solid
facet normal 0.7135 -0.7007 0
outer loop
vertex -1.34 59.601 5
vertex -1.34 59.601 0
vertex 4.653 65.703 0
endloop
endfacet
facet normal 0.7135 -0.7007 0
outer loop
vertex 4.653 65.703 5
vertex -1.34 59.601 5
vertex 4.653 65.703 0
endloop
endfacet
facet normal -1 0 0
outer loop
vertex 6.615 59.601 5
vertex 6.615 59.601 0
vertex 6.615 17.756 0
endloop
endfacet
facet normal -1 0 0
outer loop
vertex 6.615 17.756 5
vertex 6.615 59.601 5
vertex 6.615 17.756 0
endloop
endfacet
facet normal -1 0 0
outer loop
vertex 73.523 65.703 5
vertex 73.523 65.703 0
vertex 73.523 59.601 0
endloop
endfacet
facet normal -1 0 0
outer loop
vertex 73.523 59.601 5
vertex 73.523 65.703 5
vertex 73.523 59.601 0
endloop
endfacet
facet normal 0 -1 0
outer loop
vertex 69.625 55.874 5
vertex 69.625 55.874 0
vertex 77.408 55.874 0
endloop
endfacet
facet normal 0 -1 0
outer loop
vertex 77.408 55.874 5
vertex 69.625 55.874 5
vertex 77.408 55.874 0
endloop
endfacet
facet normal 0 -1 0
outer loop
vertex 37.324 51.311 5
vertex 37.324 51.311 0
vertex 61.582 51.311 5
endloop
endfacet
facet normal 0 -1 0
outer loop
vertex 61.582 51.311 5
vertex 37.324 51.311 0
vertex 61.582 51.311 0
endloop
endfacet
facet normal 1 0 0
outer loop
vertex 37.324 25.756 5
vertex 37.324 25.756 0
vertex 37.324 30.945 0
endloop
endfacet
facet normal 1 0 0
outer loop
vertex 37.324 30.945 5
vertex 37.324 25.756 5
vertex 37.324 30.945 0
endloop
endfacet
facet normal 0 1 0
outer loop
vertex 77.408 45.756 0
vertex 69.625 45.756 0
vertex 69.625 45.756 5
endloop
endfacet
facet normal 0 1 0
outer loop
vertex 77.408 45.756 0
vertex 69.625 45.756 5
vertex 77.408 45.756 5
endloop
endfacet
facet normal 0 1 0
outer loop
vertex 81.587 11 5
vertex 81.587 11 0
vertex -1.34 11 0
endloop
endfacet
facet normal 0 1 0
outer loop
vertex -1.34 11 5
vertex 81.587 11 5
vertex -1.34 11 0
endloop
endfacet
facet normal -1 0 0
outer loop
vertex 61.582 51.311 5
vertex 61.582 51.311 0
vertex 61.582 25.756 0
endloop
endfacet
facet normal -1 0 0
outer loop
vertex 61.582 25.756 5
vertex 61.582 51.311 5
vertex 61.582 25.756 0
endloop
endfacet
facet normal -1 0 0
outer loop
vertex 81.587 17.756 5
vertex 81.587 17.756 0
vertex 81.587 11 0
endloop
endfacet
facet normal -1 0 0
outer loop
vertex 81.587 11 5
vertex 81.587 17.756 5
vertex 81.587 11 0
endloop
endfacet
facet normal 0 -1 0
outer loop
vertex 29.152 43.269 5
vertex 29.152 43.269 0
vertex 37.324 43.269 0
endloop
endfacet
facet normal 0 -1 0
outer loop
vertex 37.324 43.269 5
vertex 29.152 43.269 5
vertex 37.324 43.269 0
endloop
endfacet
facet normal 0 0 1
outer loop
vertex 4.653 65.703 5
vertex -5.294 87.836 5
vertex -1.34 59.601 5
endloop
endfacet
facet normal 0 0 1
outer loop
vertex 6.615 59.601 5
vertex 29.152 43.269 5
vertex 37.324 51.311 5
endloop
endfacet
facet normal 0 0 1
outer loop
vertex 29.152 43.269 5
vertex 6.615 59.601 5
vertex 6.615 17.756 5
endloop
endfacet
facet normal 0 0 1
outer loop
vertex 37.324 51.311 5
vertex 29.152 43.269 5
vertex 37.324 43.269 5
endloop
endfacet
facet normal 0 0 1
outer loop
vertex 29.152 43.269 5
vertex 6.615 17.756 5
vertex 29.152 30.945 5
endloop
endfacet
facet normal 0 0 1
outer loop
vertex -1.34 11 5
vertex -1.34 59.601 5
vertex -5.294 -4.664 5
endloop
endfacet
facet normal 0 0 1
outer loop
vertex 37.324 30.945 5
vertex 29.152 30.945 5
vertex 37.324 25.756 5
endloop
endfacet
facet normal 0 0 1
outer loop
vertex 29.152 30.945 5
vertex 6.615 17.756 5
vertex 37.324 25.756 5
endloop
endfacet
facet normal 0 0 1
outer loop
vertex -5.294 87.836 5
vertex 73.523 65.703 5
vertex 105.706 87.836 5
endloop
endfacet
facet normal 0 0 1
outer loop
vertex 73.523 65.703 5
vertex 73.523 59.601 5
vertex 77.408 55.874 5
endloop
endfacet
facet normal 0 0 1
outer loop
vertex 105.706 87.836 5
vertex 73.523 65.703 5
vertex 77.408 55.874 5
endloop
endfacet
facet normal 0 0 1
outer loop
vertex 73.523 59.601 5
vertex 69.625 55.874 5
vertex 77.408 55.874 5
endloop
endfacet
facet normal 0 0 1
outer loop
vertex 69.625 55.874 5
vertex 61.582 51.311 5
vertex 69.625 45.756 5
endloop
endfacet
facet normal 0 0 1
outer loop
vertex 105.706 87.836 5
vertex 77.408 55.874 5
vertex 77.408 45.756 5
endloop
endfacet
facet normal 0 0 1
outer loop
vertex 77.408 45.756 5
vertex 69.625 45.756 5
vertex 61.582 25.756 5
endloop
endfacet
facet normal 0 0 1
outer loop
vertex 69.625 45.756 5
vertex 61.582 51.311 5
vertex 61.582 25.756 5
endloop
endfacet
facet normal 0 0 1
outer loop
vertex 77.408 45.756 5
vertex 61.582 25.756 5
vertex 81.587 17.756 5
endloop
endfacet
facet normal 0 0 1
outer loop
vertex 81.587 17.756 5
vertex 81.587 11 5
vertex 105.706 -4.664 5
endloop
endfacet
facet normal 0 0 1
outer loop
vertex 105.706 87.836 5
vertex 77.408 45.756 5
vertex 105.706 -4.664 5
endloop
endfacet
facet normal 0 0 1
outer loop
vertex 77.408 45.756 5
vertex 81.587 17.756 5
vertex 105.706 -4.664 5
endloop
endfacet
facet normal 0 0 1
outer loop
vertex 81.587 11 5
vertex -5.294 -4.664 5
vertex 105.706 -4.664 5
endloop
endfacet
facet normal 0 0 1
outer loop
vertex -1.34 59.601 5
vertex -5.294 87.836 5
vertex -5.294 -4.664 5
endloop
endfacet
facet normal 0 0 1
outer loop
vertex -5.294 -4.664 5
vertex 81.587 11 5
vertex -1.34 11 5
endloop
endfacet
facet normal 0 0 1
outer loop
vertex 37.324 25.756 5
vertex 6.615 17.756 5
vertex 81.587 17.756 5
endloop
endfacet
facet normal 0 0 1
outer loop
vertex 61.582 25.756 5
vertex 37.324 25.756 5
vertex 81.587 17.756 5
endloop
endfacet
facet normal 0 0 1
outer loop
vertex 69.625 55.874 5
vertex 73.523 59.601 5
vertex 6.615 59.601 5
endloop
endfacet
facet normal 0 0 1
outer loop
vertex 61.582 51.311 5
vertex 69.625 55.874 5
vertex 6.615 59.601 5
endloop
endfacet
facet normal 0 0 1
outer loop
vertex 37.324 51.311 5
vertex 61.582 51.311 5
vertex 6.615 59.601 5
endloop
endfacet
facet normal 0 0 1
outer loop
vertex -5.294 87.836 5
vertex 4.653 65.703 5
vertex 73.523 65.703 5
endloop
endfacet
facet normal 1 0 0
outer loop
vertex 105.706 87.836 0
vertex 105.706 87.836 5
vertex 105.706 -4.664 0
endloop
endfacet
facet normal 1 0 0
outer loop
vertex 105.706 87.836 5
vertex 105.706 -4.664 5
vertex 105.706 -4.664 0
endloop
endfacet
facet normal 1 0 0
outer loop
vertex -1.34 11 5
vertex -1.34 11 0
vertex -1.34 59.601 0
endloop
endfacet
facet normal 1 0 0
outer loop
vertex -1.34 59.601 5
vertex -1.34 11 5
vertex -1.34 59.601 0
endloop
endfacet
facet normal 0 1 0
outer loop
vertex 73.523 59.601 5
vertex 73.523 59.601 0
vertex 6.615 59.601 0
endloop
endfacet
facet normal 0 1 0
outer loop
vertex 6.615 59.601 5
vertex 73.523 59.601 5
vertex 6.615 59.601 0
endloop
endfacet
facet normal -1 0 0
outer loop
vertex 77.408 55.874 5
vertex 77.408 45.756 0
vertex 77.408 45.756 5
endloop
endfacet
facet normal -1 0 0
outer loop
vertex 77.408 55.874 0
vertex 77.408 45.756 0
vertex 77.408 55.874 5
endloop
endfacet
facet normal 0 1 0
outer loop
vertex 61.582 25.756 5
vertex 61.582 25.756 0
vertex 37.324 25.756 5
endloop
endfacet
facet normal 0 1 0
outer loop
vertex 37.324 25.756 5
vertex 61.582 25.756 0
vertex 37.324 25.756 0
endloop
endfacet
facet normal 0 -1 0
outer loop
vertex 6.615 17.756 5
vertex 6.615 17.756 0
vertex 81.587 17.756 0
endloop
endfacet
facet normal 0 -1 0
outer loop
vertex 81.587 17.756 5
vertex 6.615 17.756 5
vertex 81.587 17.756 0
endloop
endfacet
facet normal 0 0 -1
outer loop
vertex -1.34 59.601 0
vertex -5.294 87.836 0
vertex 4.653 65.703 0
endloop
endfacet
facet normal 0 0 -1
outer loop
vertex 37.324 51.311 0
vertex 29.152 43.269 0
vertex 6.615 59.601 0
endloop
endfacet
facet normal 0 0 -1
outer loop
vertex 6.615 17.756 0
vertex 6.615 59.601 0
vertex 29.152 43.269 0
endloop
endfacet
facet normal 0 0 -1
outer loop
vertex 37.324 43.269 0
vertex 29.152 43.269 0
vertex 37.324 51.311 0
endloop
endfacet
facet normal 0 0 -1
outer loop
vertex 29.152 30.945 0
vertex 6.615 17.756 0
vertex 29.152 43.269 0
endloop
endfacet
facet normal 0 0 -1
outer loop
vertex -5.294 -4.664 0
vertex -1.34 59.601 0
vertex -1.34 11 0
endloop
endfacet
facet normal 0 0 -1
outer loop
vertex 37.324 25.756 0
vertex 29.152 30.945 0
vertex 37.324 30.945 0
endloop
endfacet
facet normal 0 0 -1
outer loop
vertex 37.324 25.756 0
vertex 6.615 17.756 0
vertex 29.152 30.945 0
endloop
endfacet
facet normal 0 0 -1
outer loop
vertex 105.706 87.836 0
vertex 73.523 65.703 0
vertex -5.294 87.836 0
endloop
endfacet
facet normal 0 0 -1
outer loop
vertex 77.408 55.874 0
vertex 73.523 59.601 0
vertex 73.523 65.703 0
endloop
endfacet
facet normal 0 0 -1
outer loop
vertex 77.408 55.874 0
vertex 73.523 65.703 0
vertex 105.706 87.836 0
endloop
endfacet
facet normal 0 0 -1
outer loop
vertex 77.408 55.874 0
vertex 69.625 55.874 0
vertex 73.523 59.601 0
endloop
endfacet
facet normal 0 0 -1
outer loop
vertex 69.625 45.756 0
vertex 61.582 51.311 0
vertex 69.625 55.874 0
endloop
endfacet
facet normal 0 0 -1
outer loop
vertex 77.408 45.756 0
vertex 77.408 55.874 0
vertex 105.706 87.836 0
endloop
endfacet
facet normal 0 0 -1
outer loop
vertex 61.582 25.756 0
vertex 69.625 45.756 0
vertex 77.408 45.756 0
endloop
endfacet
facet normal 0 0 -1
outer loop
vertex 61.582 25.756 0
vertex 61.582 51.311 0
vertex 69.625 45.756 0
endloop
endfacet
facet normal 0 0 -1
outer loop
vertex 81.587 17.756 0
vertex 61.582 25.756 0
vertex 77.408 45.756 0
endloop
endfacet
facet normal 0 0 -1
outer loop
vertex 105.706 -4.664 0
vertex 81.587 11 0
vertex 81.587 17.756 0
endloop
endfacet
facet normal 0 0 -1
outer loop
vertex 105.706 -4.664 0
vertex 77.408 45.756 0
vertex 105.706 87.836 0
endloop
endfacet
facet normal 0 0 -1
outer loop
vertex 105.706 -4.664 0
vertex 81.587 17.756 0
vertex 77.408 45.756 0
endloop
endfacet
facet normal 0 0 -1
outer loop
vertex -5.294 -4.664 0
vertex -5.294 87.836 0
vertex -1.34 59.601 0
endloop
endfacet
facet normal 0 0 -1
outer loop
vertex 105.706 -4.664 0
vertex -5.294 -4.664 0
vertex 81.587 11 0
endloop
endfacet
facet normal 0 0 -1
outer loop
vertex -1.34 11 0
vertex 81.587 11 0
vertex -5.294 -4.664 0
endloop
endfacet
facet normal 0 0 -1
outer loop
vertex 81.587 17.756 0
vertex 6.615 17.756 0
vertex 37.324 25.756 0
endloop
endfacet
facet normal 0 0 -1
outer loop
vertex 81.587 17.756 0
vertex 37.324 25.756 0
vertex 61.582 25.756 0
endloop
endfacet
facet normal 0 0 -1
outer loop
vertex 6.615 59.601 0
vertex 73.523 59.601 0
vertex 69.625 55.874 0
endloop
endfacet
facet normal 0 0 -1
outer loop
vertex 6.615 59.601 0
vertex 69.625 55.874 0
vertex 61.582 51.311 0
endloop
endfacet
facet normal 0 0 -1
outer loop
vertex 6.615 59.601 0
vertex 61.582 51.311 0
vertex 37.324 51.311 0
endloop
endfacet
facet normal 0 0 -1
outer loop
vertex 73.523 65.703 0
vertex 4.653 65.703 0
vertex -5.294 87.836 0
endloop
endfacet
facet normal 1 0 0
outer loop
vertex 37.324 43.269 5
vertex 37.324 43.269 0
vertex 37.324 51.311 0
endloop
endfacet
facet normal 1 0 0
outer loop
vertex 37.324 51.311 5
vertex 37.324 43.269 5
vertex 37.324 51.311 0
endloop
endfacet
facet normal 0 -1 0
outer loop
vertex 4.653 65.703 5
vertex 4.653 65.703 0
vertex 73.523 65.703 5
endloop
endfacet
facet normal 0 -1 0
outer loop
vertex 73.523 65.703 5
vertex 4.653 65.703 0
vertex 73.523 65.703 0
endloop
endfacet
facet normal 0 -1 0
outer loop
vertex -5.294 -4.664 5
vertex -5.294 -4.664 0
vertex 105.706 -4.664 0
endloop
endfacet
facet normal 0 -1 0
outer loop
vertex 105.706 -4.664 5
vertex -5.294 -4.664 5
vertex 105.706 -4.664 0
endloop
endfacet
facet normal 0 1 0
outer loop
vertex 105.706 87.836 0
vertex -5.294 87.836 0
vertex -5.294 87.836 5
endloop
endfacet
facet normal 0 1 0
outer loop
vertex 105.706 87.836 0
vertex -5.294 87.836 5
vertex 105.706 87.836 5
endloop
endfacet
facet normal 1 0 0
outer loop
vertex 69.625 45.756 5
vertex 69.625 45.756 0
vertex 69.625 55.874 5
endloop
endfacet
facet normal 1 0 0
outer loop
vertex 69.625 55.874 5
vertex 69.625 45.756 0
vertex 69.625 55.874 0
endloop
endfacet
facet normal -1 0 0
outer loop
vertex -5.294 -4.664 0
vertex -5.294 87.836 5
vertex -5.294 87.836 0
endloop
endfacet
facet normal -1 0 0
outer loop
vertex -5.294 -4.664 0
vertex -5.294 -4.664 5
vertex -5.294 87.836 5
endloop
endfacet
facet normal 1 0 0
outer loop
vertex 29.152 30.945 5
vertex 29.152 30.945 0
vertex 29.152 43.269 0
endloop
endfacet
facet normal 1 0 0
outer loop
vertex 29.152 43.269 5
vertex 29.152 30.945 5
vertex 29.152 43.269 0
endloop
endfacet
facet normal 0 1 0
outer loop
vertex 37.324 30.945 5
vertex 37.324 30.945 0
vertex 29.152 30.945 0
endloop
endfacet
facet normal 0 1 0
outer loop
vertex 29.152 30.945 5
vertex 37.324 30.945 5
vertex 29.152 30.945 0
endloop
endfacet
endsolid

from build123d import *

# Parameters (mm, degrees)
CROQUIS1_W              = 111
CROQUIS1_H              = 86.5
CROQUIS1_W_2            = 7.783251258
CROQUIS1_H_2            = 10.118226634
SALIENTE_EXTRUIR1_DEPTH = 5
CROQUIS3_W              = 111
CROQUIS3_H              = 5
SALIENTE_EXTRUIR2_DEPTH = 6


with BuildPart() as part:
    # Croquis1 → Saliente-Extruir1 (new body)
    with BuildSketch(Plane.XY):
        with Locations((50.205582562, 38.585714286)):
            Rectangle(CROQUIS1_W, CROQUIS1_H)
        Polygon((-1.339906851, 59.600947476), (4.653483533, 65.703308594), (73.52298758, 65.703308594), (73.52298758, 59.600947476), (6.614956749, 59.600947476), (6.614956749, 17.756185524), (81.586821915, 17.756185524), (81.586821915, 11), (6.614956749, 11), (-1.339906851, 11), align=None, mode=Mode.SUBTRACT)
        Polygon((29.151946634, 43.268500853), (37.324360454, 43.268500853), (37.324360454, 51.311193819), (61.582160207, 51.311193819), (61.582160207, 25.756185524), (37.324360454, 25.756185524), (37.324360454, 30.945019695), (29.151946634, 30.945019695), align=None, mode=Mode.SUBTRACT)
        with Locations((73.516478802, 50.815298841)):
            Rectangle(CROQUIS1_W_2, CROQUIS1_H_2, mode=Mode.SUBTRACT)
    extrude(amount=SALIENTE_EXTRUIR1_DEPTH)

    # Croquis3 → Saliente-Extruir2 (add)
    with BuildSketch(Plane(origin=(0, 81.835714286, 0), x_dir=(1, 0, 0), z_dir=(0, 1, 0))):
        with Locations((50.205582562, -2.5)):
            Rectangle(CROQUIS3_W, CROQUIS3_H)
    extrude(amount=SALIENTE_EXTRUIR2_DEPTH)


solid = part.part
